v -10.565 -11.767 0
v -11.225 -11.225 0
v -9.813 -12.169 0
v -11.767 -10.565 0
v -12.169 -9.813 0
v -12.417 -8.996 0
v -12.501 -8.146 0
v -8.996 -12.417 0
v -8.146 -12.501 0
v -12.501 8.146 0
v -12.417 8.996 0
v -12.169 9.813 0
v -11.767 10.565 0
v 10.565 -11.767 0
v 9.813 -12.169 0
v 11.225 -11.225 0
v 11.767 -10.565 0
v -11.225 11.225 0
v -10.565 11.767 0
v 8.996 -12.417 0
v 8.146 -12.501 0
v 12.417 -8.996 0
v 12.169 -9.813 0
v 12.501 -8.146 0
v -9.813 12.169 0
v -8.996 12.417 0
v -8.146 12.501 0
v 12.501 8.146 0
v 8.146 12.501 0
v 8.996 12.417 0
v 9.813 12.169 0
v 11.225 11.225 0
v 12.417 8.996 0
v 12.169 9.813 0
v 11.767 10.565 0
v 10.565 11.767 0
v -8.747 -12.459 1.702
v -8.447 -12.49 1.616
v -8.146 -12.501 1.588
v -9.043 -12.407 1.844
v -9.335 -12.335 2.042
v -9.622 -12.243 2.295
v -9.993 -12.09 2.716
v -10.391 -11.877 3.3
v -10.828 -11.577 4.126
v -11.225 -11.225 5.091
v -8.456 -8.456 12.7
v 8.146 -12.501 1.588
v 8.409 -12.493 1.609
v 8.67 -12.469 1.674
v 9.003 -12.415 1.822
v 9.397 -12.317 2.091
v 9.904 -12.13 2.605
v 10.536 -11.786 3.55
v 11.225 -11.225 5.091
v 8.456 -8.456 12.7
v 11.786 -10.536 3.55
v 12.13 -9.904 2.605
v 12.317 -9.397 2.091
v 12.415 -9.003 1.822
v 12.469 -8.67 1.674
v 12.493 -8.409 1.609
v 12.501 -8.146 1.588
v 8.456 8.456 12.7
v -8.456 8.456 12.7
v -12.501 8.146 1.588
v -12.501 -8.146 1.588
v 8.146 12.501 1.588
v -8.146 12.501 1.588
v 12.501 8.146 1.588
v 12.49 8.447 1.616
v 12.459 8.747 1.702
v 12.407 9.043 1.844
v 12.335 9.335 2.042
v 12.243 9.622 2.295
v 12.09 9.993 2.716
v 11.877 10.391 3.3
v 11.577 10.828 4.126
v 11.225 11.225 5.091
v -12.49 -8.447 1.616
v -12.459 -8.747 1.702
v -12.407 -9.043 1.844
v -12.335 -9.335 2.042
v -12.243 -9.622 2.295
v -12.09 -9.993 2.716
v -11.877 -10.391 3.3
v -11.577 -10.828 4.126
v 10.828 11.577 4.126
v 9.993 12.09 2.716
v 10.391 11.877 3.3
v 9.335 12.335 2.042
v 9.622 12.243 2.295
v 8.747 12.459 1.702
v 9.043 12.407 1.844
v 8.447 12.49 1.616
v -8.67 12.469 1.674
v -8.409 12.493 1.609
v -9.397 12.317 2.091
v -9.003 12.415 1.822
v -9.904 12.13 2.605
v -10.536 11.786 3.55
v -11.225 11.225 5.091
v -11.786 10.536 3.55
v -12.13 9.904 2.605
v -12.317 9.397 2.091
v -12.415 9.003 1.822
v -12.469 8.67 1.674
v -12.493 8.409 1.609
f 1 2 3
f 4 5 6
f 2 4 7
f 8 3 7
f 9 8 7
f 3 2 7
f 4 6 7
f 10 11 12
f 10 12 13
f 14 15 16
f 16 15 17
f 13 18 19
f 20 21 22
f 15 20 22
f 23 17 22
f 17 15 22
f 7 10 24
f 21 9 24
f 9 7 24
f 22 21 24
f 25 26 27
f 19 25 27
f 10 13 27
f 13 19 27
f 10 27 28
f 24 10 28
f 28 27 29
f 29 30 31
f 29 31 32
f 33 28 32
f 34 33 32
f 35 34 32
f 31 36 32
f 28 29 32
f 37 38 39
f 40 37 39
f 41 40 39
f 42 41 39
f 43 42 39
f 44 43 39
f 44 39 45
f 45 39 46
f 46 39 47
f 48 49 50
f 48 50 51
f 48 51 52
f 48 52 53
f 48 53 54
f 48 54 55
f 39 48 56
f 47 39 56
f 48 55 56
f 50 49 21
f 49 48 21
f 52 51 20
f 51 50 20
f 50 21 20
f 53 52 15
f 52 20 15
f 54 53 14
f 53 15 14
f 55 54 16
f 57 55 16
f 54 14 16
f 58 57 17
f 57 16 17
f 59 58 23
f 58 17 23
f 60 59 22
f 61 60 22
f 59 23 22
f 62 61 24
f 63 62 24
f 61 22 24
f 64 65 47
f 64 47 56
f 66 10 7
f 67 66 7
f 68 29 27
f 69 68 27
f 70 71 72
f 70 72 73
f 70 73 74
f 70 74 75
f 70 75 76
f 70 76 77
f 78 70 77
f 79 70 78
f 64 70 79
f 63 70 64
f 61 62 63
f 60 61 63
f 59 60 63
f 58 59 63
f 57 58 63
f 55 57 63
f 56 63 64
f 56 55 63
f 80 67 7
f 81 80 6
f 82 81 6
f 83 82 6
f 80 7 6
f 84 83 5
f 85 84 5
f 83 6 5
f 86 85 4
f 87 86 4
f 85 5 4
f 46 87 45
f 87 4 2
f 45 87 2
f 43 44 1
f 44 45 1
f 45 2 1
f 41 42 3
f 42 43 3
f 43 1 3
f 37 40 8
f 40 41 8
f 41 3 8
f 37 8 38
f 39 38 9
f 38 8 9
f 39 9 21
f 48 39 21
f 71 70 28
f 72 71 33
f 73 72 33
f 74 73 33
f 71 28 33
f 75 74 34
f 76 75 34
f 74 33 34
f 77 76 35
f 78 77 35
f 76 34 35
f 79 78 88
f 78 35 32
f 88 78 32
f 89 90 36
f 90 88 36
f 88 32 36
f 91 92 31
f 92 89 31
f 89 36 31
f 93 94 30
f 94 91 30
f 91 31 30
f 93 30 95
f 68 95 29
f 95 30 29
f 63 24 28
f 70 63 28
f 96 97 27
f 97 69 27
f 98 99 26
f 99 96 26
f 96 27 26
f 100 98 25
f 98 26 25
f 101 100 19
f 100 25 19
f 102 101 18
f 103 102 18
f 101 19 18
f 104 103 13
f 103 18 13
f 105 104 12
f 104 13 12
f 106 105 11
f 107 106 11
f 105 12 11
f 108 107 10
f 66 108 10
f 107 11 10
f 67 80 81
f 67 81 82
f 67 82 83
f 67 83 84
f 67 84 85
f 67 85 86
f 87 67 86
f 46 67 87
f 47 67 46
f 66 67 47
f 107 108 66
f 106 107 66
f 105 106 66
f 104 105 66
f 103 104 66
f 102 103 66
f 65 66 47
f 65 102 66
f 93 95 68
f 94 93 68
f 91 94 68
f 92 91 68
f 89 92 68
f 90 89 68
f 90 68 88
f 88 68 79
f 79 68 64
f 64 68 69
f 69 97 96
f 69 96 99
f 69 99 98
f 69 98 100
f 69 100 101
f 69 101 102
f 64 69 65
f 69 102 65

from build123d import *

# Parameters (mm, degrees)
SKETCH1_R           = 4.354315493
BOSS_EXTRUDE1_DEPTH = 12.7
CUT_EXTRUDE1_DEPTH  = 25.4
CUT_EXTRUDE2_DEPTH  = 25.4


with BuildPart() as part:
    # Sketch1 → Boss-Extrude1 (new body)
    with BuildSketch(Plane.XY):
        with BuildLine():
            ThreePointArc((-3.792038647, 8.146354139), (-8.146354139, 3.792038647), (-12.500669632, 8.146354139))
            Line((-12.500669632, 8.146354139), (-12.500669632, -8.146354139))
            ThreePointArc((-12.500669632, -8.146354139), (-8.146354139, -3.792038647), (-3.792038647, -8.146354139))
            ThreePointArc((-3.792038647, -8.146354139), (-5.067388127, -11.225320151), (-8.146354139, -12.500669632))
            Line((-8.146354139, -12.500669632), (8.146354139, -12.500669632))
            ThreePointArc((8.146354139, -12.500669632), (5.067388127, -5.067388127), (12.500669632, -8.146354139))
            Line((12.500669632, -8.146354139), (12.500669632, 8.146354139))
            ThreePointArc((12.500669632, 8.146354139), (5.067388127, 5.067388127), (8.146354139, 12.500669632))
            Line((8.146354139, 12.500669632), (-8.146354139, 12.500669632))
            ThreePointArc((-8.146354139, 12.500669632), (-5.067388127, 11.225320151), (-3.792038647, 8.146354139))
        make_face()
        with Locations((-8.146354139, 8.146354139)):
            Circle(SKETCH1_R)
        with Locations((-8.146354139, -8.146354139)):
            Circle(SKETCH1_R)
        with Locations((8.146354139, 8.146354139)):
            Circle(SKETCH1_R)
        with Locations((8.146354139, -8.146354139)):
            Circle(SKETCH1_R)
    extrude(amount=BOSS_EXTRUDE1_DEPTH)

    # Sketch2 → Cut-Extrude1 (cut, symmetric)
    with BuildSketch(Plane(origin=(0, 0, 0), x_dir=(0, 0, -1), z_dir=(1, 0, 0))):
        Polygon((-12.7, 12.500669632), (-1.5875, 12.500669632), (-12.7, 8.456050403), align=None)
        Polygon((-1.5875, -12.500669632), (-12.7, -8.456050403), (-12.7, -12.500669632), align=None)
    extrude(amount=CUT_EXTRUDE1_DEPTH, both=True, mode=Mode.SUBTRACT)

    # Sketch3 → Cut-Extrude2 (cut, symmetric)
    with BuildSketch(Plane(origin=(0, 0, 0), x_dir=(1, 0, 0), z_dir=(0, 1, 0))):
        Polygon((12.500669632, -1.5875), (8.456050403, -12.7), (12.500669632, -12.7), align=None)
        Polygon((-8.456050403, -12.7), (-12.500669632, -12.7), (-12.500669632, -1.5875), align=None)
    extrude(amount=CUT_EXTRUDE2_DEPTH, both=True, mode=Mode.SUBTRACT)


solid = part.part
